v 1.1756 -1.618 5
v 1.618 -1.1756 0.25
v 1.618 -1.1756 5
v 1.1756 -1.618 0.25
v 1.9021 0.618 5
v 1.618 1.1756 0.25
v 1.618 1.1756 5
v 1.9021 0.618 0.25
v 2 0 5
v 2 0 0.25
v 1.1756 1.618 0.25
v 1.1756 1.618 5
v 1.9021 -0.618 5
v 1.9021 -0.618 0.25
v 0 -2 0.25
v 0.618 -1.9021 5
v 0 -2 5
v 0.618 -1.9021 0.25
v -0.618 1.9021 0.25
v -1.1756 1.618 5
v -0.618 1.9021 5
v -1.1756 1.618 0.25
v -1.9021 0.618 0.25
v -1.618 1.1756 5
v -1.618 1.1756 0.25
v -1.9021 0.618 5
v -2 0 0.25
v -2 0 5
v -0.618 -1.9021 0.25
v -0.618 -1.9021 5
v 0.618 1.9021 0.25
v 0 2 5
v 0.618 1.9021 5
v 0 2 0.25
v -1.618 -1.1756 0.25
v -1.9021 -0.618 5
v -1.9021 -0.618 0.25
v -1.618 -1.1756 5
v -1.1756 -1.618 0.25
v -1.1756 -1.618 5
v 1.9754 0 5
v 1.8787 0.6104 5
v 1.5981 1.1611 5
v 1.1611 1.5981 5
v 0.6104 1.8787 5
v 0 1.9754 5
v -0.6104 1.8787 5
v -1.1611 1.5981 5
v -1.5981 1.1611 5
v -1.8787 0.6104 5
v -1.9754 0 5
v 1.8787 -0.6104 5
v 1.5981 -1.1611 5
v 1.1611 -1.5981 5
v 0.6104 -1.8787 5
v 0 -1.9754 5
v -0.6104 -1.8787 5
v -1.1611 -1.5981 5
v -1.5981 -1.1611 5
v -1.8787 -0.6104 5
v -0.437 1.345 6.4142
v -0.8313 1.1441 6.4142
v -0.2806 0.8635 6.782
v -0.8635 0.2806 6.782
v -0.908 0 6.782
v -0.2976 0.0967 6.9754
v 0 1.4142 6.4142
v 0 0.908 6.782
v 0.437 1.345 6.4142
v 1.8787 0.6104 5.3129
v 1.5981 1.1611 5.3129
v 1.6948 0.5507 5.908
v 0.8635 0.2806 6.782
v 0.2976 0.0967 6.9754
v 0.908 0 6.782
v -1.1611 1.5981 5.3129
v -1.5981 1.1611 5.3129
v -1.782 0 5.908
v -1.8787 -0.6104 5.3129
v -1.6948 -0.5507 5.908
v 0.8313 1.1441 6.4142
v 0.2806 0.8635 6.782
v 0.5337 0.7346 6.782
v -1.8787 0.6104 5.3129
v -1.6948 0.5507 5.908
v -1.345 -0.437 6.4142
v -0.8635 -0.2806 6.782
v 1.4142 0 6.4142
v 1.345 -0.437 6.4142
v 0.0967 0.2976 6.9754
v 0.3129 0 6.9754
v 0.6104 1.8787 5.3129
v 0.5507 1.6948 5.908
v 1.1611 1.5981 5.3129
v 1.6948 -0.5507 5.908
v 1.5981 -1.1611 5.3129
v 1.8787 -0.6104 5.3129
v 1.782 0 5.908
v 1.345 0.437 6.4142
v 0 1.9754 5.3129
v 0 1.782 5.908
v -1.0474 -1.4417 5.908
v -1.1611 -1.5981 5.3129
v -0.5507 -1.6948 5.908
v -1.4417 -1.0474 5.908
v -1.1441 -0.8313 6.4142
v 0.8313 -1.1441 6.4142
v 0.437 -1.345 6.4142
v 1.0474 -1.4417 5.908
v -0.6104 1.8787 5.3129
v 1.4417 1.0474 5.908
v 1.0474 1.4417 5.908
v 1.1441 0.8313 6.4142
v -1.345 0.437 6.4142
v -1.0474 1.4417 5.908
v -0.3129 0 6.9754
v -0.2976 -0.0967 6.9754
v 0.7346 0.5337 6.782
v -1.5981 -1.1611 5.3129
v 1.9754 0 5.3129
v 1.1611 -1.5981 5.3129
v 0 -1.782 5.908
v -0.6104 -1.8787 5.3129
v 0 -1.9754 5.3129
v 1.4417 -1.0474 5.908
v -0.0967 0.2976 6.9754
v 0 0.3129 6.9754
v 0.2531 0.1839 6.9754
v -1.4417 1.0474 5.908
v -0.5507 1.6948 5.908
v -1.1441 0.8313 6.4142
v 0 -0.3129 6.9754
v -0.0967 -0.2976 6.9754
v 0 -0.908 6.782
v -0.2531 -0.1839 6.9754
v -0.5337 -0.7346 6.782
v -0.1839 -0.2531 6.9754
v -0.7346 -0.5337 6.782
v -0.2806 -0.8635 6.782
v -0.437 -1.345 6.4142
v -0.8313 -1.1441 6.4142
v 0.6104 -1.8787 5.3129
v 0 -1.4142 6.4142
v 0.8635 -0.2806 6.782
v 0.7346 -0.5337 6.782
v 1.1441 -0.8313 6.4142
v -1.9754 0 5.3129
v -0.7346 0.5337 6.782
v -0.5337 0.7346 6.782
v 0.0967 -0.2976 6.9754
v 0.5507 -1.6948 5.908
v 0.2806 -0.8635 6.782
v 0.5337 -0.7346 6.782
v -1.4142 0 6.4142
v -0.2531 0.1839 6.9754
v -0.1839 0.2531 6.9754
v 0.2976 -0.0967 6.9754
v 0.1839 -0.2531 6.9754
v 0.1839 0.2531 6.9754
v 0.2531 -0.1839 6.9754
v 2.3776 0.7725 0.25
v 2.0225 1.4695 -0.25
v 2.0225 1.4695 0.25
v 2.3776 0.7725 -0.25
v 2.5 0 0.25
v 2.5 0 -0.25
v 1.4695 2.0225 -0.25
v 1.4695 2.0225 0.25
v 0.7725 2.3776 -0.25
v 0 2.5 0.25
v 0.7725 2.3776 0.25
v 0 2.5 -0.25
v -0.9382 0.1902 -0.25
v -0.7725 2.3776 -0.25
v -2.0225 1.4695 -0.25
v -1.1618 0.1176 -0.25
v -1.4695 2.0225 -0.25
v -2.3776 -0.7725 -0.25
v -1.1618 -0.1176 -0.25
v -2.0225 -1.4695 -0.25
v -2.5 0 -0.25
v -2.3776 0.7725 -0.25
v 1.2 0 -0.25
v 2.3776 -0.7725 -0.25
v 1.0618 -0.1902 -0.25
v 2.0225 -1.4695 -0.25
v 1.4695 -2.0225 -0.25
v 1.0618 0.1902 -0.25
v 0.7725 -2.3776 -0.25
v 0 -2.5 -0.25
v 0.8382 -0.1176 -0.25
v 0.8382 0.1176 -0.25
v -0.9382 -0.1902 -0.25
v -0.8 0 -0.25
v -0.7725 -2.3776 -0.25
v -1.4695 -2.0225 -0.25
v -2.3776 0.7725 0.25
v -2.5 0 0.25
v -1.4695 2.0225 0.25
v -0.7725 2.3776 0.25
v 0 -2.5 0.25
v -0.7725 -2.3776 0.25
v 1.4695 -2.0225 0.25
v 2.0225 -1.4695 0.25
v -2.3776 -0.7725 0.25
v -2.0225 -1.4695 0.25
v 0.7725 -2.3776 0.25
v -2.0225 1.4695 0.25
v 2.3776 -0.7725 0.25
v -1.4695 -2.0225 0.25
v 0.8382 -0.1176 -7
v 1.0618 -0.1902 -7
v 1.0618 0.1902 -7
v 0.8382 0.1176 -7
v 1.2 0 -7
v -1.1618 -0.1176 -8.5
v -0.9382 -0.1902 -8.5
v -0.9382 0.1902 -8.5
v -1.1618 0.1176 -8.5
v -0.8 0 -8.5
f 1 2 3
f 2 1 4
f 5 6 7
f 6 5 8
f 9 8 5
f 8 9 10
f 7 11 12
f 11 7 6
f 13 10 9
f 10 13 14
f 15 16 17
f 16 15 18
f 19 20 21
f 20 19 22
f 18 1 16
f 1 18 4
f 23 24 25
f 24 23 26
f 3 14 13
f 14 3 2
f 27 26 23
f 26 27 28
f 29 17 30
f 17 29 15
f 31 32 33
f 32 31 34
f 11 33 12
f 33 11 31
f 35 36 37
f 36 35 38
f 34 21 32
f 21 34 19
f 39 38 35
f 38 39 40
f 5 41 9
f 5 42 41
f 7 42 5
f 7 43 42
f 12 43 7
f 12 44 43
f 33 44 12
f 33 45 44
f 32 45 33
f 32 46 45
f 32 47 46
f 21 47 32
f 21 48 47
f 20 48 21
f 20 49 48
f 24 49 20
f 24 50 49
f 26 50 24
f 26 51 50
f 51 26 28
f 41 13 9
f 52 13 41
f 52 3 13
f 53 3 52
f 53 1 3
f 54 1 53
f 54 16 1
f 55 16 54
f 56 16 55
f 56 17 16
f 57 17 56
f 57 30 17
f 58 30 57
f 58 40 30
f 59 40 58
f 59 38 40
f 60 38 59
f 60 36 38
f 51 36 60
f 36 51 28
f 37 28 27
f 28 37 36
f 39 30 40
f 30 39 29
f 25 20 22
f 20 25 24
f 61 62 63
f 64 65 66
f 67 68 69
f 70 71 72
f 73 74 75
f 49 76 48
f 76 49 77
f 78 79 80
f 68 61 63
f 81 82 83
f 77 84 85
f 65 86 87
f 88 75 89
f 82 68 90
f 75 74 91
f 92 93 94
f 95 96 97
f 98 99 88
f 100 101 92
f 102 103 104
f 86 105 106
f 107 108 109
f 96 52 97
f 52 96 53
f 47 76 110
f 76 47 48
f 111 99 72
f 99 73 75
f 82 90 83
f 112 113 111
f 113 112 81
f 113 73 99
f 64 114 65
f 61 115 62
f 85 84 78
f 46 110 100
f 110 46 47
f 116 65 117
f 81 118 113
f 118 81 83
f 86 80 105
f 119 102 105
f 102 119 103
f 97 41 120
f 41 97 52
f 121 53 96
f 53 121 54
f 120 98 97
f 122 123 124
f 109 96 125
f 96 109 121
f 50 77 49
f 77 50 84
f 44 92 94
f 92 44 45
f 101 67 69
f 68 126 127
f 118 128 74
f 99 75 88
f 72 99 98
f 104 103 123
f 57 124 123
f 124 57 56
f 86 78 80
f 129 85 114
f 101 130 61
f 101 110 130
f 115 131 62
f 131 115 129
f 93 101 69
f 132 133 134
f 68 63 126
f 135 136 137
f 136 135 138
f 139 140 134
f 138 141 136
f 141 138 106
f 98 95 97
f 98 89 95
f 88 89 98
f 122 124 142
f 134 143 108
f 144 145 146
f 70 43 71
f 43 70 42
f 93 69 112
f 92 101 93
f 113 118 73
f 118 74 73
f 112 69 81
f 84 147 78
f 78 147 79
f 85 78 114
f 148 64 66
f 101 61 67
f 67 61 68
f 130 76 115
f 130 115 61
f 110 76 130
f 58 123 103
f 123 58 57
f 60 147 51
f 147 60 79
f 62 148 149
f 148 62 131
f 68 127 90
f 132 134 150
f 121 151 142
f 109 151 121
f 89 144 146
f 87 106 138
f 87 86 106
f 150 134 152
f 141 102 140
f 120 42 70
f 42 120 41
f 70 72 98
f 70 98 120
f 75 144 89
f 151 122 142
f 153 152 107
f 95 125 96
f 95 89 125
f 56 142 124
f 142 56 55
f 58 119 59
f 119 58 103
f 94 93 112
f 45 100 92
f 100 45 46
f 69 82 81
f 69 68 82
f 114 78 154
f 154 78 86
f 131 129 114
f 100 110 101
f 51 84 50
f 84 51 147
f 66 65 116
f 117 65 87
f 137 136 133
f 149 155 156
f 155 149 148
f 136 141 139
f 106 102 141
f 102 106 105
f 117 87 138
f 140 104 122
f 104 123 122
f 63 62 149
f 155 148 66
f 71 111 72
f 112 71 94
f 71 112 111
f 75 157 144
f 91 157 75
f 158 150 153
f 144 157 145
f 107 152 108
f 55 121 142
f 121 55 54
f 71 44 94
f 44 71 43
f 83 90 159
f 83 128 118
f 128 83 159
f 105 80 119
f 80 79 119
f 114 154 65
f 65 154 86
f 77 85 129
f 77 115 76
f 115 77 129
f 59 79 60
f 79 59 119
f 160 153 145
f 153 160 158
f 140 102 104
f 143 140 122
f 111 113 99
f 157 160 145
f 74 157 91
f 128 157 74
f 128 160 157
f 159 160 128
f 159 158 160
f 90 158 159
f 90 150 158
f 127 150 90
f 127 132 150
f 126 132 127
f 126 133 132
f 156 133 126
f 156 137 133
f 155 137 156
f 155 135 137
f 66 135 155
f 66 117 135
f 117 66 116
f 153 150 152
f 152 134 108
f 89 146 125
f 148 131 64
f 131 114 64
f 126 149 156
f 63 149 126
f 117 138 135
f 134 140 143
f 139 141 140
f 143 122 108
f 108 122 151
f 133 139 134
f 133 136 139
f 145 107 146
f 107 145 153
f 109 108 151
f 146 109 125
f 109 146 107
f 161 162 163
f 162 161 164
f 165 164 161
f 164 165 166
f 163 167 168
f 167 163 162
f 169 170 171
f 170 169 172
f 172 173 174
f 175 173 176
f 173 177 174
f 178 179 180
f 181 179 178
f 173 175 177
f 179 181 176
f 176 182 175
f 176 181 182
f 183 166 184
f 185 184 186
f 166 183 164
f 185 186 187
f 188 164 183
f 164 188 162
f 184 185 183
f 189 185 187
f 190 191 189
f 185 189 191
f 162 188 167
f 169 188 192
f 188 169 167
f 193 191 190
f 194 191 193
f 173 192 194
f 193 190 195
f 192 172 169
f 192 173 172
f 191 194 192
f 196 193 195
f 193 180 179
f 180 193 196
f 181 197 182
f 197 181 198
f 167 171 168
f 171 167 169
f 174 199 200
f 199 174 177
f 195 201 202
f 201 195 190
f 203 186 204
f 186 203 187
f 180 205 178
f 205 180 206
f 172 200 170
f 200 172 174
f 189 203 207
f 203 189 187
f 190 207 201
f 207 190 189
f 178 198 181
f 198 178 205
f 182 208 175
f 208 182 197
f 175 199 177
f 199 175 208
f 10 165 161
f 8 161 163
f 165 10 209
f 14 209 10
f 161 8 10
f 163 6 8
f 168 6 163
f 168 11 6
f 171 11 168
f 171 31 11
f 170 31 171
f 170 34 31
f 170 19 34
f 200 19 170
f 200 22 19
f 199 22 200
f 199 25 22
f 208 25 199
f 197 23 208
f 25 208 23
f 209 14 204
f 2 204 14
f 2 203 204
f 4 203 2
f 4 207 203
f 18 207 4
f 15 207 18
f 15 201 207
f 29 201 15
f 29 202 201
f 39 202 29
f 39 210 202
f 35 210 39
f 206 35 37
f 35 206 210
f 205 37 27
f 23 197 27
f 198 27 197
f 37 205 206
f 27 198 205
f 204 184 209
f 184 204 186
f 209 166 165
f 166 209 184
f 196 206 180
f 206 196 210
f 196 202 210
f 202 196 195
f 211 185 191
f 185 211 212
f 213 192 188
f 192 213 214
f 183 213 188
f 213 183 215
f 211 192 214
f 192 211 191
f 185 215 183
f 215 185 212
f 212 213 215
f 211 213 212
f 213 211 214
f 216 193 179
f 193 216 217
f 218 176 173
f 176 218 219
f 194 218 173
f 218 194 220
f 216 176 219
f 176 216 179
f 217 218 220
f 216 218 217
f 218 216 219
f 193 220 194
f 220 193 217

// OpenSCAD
module Led(Mat = 0){

    Red = "#f70d1a";
    Green = "#50C878";
    Blue = "#162c99";
    Yellow = "#e9d366";
    White = "#fefdfa";

    Material = [Red,Green,Blue,Yellow,White];

    union(){
        color(Material[Mat], alpha = 0.9)
        cylinder(5,2,2, $fn = 20);

        color(Material[Mat], alpha = 0.9)
        translate([0,0,5])
        sphere(r = 2.0 ,$fn = 20);
    }

    color(Material[Mat], alpha = 0.9)
    cylinder(0.5,2.5,2.5, $fn = 20, center= true);

    color("gray")
    translate([1,0,-3])
    cylinder(8,0.2,0.2, $fn = 5, center= true);

    color("gray")
    translate([-1,0,-3])
    cylinder(11,0.2,0.2, $fn = 5, center= true);

}

Led(Mat = 2);


// Written by Nicolì Angelo (Gengio) 2024: 
// MIT License

//Permission is hereby granted, free of charge, to any person obtaining a copy of this software and associated documentation files (the "Software"), to deal in the Software without restriction, including without limitation the rights to use, copy, modify, merge, publish, distribute, sublicense, and/or sell copies of the Software, and to permit persons to whom the Software is furnished to do so, subject to the following conditions:

//The above copyright notice and this permission notice shall be included in all copies or substantial portions of the Software.

//THE SOFTWARE IS PROVIDED "AS IS", WITHOUT WARRANTY OF ANY KIND, EXPRESS OR IMPLIED, INCLUDING BUT NOT LIMITED TO THE WARRANTIES OF MERCHANTABILITY, FITNESS FOR A PARTICULAR PURPOSE AND NONINFRINGEMENT. IN NO EVENT SHALL THE AUTHORS OR COPYRIGHT HOLDERS BE LIABLE FOR ANY CLAIM, DAMAGES OR OTHER LIABILITY, WHETHER IN AN ACTION OF CONTRACT, TORT OR OTHERWISE, ARISING FROM, OUT OF OR IN CONNECTION WITH THE SOFTWARE OR THE USE OR OTHER DEALINGS IN THE SOFTWARE.
